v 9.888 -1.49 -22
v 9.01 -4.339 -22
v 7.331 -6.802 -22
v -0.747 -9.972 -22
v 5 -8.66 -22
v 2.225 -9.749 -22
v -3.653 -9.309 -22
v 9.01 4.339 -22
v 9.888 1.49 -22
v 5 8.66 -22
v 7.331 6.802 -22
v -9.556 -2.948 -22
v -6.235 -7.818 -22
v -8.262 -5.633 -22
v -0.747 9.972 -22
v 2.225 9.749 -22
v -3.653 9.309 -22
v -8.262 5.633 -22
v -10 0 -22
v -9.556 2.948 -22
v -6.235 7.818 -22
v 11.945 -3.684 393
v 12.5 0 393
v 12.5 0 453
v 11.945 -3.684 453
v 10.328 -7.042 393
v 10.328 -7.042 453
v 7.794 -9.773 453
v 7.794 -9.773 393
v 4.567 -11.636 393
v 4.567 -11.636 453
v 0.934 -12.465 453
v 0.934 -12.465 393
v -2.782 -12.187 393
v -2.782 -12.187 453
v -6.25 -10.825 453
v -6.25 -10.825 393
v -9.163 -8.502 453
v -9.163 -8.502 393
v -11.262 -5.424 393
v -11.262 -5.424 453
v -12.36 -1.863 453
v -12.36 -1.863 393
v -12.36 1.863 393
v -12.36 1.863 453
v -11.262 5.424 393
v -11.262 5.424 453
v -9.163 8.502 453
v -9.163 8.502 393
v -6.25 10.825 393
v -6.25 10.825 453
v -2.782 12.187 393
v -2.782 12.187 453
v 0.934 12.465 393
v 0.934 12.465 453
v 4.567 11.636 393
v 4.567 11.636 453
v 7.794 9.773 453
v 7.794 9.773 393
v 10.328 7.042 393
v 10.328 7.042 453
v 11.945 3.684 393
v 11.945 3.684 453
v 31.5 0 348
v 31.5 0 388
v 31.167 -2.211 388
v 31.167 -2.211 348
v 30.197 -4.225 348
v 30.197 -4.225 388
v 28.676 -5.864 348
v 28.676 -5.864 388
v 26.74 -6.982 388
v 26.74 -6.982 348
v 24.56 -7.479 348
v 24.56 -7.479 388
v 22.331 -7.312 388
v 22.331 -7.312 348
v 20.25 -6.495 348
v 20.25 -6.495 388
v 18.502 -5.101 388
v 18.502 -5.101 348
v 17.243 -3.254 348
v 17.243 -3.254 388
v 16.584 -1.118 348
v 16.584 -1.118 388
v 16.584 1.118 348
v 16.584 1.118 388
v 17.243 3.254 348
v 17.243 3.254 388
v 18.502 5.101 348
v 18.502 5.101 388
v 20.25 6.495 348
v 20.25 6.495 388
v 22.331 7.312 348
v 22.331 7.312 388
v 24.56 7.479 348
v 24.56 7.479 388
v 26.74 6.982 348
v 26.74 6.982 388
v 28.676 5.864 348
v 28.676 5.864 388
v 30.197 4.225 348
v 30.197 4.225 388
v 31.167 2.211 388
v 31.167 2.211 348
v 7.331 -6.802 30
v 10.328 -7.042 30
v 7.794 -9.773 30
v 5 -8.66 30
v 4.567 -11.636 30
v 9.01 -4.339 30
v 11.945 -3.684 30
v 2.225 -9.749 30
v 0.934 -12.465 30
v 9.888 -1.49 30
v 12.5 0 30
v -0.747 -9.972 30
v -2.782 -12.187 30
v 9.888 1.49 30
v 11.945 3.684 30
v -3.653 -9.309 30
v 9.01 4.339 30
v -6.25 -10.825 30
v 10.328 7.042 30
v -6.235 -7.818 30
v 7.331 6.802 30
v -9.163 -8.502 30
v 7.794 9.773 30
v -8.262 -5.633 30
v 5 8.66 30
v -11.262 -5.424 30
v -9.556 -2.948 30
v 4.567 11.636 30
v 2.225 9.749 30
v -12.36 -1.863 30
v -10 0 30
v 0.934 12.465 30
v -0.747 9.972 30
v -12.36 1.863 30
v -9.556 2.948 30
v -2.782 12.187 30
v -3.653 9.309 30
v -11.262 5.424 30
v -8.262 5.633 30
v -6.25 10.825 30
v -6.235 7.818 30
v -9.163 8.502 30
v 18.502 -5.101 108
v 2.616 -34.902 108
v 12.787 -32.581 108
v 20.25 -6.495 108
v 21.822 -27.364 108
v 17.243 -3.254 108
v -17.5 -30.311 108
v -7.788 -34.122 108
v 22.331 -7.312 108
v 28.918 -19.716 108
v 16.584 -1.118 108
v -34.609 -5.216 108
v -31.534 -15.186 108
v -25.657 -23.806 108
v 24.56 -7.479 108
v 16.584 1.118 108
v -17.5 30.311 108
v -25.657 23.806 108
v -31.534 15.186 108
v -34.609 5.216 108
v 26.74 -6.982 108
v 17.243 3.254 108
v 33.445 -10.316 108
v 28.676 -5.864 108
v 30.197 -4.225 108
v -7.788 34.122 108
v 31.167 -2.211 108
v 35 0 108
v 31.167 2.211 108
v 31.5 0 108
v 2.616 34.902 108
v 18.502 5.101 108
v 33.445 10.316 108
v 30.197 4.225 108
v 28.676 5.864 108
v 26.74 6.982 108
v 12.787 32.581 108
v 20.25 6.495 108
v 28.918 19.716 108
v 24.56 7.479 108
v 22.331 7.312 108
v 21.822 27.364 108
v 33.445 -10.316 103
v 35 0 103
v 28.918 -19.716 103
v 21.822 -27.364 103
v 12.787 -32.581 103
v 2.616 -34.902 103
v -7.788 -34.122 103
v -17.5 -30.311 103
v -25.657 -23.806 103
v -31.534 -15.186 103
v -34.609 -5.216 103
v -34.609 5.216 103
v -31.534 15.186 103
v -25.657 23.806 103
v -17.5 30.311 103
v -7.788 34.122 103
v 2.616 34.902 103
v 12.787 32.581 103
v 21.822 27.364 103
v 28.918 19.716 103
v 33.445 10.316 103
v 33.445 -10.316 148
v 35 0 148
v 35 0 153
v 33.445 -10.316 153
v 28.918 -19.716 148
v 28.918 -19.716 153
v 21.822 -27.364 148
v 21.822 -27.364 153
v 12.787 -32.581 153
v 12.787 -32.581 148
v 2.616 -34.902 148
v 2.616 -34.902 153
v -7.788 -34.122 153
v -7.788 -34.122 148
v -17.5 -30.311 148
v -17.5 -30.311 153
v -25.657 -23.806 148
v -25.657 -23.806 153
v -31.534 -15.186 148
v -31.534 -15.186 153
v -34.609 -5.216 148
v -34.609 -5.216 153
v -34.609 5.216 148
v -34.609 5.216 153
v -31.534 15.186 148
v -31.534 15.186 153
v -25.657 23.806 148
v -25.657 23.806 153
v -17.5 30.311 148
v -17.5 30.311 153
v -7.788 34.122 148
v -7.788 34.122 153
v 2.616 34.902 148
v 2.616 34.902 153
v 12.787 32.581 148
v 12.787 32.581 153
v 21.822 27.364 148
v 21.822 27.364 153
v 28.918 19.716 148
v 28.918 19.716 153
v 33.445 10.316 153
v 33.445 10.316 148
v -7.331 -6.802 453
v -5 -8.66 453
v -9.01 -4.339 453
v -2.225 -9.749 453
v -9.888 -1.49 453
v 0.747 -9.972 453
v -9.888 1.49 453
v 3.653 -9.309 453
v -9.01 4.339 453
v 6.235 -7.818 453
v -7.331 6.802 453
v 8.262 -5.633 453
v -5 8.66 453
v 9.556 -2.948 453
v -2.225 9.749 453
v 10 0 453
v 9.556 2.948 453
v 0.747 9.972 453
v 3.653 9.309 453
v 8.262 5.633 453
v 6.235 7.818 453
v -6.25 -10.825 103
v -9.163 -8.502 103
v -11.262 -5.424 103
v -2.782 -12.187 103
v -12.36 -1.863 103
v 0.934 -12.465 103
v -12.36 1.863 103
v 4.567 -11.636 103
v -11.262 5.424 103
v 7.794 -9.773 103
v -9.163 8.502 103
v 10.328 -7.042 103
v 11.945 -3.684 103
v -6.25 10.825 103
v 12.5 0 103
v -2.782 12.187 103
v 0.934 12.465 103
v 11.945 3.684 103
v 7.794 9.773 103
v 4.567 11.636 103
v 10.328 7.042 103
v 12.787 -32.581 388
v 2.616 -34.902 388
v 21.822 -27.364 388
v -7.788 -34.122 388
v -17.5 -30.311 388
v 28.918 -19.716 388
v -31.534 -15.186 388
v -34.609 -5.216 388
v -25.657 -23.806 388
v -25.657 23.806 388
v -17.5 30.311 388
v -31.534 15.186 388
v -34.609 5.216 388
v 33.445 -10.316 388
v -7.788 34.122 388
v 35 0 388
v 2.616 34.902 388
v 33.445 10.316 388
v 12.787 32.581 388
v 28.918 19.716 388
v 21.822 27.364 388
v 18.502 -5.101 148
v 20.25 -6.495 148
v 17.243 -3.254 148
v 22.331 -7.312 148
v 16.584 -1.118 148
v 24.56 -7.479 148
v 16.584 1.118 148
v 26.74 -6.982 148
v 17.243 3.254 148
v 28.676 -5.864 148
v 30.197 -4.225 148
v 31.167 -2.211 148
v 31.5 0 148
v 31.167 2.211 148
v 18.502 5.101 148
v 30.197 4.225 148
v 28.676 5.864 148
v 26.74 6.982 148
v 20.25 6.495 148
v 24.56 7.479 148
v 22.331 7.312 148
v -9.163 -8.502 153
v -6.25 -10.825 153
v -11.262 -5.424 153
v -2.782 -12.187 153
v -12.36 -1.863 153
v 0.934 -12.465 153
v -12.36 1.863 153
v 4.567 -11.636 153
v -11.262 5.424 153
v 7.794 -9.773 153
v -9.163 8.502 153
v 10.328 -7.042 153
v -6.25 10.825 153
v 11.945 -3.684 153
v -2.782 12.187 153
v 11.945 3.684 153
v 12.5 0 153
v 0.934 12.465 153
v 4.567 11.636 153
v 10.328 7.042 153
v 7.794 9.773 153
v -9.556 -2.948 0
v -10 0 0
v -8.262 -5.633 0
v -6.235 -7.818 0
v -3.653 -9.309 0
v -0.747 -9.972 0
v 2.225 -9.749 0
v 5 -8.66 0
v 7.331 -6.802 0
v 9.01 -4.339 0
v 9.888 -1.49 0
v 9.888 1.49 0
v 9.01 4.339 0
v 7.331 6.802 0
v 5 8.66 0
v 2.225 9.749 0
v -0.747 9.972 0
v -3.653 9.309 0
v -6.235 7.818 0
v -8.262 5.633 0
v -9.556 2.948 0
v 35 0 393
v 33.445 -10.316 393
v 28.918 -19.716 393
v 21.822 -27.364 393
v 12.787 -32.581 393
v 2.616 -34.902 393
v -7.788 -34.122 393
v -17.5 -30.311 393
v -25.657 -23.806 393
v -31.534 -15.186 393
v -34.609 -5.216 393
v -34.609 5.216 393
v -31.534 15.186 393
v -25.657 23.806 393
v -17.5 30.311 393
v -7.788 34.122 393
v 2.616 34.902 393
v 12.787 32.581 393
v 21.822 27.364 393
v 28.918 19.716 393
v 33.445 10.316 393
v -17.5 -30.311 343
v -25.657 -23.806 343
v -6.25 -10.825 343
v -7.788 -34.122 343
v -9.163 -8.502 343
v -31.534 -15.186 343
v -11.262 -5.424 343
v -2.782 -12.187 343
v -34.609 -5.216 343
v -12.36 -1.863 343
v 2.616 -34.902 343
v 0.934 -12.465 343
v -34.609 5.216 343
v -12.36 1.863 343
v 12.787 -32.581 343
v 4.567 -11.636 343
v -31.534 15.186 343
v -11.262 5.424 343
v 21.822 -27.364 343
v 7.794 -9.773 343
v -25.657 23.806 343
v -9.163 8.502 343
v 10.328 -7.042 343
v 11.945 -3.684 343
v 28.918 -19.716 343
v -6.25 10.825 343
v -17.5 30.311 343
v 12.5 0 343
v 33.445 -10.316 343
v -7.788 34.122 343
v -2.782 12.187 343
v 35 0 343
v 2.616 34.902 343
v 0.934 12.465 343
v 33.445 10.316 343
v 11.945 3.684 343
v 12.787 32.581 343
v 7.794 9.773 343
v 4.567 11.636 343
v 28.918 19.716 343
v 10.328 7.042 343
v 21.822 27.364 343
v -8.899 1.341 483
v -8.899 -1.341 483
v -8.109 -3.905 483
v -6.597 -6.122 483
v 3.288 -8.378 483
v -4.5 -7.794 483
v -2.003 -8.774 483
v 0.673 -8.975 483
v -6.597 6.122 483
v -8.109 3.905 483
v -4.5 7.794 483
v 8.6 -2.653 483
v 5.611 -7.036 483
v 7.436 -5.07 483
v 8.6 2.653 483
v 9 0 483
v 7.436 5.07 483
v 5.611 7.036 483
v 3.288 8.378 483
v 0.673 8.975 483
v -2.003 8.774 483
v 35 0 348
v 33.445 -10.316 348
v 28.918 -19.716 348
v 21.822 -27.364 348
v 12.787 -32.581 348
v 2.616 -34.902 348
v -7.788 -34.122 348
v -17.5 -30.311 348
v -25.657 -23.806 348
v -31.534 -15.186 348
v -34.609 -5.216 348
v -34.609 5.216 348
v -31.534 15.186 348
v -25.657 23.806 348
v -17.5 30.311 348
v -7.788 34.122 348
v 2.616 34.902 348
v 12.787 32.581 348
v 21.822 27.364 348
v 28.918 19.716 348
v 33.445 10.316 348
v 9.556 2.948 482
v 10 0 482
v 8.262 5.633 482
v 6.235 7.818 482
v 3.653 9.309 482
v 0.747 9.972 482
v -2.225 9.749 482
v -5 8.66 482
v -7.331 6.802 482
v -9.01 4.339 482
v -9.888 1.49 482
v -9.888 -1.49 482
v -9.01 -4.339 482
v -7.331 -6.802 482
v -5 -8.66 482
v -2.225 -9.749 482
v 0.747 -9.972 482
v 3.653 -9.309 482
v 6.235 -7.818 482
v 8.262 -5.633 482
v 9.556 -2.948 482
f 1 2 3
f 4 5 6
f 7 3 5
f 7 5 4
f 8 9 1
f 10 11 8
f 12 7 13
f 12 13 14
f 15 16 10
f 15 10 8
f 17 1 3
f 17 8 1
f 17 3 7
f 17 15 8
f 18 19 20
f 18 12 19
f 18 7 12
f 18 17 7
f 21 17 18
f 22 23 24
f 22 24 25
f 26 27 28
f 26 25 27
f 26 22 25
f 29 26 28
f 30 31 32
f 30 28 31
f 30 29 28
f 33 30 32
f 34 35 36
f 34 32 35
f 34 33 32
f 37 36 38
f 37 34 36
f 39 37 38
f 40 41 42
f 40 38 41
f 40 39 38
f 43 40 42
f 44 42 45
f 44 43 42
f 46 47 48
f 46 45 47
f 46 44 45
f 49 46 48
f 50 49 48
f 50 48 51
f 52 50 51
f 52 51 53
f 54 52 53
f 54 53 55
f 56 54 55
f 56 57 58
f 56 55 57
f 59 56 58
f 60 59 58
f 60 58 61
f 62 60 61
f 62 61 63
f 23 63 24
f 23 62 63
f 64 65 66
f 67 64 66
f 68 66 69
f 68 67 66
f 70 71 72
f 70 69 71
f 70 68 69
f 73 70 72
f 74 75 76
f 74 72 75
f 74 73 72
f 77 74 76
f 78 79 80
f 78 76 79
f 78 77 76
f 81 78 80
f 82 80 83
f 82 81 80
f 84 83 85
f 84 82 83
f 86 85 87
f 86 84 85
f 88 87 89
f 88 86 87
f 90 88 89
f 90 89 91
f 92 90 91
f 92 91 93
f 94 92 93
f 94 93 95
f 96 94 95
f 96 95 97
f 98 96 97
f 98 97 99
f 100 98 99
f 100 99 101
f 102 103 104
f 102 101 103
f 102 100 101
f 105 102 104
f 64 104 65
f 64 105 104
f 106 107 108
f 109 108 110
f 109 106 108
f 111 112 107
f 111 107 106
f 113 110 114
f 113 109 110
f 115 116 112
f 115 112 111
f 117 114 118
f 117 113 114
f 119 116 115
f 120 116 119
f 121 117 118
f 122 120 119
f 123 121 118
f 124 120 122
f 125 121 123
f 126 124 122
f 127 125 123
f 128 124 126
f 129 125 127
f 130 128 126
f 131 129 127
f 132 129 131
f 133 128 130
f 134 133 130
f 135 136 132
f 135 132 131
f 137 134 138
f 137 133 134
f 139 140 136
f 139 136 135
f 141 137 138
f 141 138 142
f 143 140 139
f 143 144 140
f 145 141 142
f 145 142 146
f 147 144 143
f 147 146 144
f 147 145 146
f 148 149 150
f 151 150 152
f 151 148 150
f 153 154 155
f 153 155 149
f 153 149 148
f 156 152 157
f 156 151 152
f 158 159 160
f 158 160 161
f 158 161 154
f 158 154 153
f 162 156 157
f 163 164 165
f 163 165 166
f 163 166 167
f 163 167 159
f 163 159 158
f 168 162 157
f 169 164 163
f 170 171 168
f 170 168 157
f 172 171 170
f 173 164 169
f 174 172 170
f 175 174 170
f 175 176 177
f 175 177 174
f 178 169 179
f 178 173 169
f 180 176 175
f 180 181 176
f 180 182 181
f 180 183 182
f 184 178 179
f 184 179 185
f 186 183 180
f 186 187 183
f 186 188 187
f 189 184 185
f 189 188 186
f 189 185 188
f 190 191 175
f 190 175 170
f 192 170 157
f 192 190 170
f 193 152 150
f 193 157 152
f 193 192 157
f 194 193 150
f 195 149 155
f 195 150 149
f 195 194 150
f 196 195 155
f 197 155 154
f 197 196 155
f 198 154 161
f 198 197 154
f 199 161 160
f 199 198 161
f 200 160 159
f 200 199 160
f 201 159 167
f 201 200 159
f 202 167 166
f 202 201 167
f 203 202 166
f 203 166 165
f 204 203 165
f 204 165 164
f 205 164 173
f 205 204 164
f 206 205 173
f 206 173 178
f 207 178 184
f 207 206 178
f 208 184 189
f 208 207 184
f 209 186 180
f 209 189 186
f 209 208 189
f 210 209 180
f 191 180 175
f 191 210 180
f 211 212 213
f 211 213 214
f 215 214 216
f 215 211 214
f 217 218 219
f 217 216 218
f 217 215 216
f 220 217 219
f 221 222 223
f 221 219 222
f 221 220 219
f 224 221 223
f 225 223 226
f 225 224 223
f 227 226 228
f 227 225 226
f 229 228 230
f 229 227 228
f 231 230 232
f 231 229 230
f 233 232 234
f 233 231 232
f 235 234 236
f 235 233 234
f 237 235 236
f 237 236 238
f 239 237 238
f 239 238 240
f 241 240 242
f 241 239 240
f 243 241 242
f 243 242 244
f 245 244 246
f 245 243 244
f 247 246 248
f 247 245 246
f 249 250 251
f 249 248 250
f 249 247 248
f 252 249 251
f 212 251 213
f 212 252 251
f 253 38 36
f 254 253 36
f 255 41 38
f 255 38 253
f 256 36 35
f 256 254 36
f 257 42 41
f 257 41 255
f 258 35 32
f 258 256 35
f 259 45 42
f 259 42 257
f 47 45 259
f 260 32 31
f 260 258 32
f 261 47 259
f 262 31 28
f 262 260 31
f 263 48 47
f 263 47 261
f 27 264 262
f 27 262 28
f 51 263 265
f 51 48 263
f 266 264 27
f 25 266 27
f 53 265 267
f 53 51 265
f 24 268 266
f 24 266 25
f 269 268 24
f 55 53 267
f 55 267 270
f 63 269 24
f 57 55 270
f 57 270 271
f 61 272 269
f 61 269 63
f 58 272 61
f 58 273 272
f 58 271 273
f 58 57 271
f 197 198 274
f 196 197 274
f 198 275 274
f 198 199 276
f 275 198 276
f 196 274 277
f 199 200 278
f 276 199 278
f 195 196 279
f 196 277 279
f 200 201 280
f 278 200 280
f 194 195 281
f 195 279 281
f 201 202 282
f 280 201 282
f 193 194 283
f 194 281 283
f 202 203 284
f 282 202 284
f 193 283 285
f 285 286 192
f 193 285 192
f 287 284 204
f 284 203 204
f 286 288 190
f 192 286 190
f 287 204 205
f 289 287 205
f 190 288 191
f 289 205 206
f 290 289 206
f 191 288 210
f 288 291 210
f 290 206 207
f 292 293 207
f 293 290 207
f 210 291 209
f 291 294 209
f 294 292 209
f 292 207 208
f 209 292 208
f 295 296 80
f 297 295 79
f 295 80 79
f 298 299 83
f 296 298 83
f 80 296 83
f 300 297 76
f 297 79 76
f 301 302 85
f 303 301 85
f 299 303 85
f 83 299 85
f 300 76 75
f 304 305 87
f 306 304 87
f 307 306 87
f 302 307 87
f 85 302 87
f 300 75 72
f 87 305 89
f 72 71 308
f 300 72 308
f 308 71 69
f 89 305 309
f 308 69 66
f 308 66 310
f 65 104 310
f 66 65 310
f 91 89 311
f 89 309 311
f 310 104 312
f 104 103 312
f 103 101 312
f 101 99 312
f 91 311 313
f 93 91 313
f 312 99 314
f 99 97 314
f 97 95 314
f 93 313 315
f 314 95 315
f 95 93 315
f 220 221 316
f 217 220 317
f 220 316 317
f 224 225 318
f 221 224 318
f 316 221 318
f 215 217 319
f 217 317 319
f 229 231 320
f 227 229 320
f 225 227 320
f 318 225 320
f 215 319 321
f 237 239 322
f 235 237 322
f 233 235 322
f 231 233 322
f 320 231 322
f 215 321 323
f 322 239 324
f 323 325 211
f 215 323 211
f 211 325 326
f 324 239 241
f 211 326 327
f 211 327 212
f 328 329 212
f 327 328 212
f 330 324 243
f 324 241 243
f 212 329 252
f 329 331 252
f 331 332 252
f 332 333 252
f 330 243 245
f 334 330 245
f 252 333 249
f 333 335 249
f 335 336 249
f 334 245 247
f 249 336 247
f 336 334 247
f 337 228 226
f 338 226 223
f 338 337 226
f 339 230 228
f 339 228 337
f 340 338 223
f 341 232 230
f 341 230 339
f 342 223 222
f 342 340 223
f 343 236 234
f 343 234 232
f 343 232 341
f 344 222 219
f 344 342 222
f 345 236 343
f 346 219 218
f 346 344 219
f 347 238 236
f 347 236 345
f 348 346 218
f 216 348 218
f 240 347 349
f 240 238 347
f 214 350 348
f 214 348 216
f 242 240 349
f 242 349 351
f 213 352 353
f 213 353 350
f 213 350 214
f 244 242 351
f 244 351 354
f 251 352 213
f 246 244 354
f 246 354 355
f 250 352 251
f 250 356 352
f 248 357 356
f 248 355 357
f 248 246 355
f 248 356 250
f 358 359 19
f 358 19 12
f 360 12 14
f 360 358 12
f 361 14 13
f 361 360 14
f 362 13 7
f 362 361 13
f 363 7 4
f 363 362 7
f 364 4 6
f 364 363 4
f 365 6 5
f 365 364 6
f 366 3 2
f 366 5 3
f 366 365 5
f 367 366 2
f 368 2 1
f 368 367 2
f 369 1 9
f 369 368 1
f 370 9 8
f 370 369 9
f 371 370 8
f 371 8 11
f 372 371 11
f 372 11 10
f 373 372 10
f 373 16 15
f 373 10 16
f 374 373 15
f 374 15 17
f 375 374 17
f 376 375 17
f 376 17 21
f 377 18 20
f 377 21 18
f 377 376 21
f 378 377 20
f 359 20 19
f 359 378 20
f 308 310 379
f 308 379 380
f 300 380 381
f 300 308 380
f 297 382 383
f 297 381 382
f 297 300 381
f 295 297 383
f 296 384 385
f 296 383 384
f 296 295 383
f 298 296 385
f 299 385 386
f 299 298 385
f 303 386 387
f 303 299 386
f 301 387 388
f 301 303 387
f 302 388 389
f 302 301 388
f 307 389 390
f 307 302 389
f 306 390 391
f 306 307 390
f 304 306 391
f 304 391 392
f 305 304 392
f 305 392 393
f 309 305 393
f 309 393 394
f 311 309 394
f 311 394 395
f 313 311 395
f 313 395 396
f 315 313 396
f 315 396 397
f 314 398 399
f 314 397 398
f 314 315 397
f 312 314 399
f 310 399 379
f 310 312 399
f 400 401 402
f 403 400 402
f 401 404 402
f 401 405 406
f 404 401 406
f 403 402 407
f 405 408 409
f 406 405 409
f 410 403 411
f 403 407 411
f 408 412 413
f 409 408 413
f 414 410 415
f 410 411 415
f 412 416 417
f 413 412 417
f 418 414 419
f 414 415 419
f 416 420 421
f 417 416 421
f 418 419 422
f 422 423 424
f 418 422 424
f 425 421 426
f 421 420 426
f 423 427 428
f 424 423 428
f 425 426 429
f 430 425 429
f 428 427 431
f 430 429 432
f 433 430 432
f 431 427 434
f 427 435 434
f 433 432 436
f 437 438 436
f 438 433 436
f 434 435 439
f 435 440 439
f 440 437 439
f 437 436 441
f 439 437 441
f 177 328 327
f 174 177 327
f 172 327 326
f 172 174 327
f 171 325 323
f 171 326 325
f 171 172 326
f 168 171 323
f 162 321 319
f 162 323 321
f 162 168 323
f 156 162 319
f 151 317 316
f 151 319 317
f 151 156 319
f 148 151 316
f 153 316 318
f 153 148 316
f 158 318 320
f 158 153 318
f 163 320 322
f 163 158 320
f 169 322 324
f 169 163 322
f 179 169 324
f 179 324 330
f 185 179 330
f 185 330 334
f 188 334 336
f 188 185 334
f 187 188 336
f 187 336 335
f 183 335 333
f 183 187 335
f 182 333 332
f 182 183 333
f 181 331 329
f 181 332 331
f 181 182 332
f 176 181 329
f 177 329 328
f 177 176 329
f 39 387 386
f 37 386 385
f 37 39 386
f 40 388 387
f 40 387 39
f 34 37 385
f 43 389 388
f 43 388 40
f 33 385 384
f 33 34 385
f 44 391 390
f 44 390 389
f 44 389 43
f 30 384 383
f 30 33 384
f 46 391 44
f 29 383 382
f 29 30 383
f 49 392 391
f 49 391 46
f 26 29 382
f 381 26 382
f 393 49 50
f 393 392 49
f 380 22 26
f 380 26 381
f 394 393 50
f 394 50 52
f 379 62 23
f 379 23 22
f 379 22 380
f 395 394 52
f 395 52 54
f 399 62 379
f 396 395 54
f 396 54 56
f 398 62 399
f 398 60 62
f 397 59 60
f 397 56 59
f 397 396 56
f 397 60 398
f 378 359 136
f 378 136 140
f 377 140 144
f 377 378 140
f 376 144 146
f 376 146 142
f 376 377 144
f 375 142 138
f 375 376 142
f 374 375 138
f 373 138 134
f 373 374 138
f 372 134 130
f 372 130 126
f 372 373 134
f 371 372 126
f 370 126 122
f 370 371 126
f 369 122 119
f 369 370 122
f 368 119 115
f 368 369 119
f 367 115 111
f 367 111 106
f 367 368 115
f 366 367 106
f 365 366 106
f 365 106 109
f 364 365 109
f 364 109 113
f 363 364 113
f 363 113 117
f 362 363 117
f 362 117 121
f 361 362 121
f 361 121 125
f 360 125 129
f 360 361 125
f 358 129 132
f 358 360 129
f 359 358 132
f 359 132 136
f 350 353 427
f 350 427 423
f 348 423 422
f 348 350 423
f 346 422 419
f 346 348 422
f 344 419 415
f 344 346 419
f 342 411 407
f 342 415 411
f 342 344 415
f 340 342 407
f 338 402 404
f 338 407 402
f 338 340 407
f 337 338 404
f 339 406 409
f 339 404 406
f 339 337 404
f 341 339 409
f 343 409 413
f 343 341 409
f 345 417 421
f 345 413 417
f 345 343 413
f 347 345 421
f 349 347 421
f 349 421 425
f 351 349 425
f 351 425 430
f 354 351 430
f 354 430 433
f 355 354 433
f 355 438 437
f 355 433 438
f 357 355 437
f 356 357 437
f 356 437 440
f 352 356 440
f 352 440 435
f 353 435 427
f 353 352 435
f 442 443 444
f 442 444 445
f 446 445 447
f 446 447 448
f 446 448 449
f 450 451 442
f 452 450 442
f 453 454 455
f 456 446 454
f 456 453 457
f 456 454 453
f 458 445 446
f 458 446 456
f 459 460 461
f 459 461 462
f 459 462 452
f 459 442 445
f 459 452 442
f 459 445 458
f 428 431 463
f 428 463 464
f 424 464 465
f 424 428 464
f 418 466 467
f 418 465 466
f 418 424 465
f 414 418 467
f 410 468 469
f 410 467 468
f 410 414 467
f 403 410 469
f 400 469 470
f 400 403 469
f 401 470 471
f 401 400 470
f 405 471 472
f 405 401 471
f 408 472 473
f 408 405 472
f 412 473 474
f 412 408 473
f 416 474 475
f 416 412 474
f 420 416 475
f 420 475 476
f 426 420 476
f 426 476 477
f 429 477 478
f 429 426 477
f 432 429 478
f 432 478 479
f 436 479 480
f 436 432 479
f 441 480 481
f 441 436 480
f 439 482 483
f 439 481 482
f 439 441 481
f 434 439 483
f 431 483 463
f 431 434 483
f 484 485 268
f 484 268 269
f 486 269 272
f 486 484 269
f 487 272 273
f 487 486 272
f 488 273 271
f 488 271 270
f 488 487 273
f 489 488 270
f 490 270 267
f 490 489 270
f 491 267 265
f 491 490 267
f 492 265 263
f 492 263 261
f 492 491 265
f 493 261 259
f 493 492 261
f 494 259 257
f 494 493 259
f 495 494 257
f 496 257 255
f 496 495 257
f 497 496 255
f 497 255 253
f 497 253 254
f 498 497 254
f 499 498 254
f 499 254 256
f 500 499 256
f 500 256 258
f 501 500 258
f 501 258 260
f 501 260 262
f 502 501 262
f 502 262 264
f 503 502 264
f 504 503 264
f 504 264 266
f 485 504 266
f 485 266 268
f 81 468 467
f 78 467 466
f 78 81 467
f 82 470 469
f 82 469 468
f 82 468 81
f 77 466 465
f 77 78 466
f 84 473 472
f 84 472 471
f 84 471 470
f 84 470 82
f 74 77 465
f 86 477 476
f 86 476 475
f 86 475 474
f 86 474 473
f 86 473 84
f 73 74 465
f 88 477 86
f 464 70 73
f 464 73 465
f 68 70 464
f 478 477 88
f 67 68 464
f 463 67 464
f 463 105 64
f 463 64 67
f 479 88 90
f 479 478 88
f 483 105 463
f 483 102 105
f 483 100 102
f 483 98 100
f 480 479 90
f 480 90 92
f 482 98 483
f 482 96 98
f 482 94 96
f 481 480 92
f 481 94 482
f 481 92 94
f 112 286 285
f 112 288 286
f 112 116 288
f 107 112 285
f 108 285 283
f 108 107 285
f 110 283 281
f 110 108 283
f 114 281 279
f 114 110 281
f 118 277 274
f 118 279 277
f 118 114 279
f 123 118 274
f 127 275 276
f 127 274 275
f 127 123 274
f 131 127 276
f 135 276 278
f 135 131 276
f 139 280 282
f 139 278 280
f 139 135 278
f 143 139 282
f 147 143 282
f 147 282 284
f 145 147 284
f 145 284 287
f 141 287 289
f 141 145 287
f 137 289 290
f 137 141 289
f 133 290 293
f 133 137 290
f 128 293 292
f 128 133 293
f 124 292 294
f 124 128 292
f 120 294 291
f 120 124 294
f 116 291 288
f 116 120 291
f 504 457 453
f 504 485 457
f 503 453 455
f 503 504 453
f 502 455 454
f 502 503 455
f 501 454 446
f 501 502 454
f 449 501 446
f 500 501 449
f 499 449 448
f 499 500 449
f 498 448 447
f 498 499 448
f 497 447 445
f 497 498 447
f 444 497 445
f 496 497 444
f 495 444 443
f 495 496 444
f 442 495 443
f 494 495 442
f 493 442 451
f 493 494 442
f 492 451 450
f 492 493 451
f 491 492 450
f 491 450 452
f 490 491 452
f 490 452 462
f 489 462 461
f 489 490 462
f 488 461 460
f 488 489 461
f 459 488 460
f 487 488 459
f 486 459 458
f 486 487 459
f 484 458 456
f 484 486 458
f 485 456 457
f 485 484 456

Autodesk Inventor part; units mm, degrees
ref_plane "YZ Plane" through (0, 0, 0) normal (1, 0, 0) x (0, 1, 0)
ref_plane "XZ Plane" through (0, 0, 0) normal (0, 1, 0) x (-1, 0, 0)
ref_plane "XY Plane" through (0, 0, 0) normal (0, 0, 1) x (1, 0, 0)
sketch "草图1" plane through (0, 0, 0) normal (0, 0, 1) x (1, 0, 0)
  circle A0 centre (0, 0) radius 12.5
  dimension "d0" = 25
extrude "拉伸1" add sketch "草图1" along normal blind 103
sketch "草图2" plane through (0, 0, 103) normal (0, 0, 1) x (1, 0, 0)
  circle A0 centre (0, 0) radius 35
  dimension "d3" = 70
extrude "拉伸2" add sketch "草图2" along normal blind 5
sketch "草图3" plane through (0, 0, 108) normal (0, 0, 1) x (1, 0, 0)
  circle A0 centre (24, 0) radius 7.5
  line L0 (0, 0) -> (4.085, 0)
  dimension "d6" = 15
  dimension "d7" = 4.085
  dimension "d8" = 24
extrude "拉伸3" add sketch "草图3" along normal blind 40
sketch "草图4" plane through (24, 0, 148) normal (0, 0, 1) x (1, 0, 0)
  circle A0 centre (-24, 0) radius 35
  circle A1 centre (-24, 0) radius 35 projected
  dimension "d11" = 70
extrude "拉伸4" add sketch "草图4" along normal blind 5
sketch "草图5" plane through (0, 0, 153) normal (0, 0, 1) x (1, 0, 0)
  circle A0 centre (0, 0) radius 12.5
  dimension "d14" = 25
extrude "拉伸5" add sketch "草图5" along normal blind 190
sketch "草图6" plane through (0, 0, 343) normal (0, 0, 1) x (1, 0, 0)
  circle A0 centre (0, 0) radius 35
  dimension "d17" = 70
extrude "拉伸6" add sketch "草图6" along normal blind 5
sketch "草图7" plane through (0, 0, 348) normal (0, 0, 1) x (1, 0, 0)
  circle A0 centre (24, 0) radius 7.5
  circle A1 centre (24, 0) radius 7.5 projected
  point P0 (0, 0)
  dimension "d20" = 15
extrude "拉伸7" add sketch "草图7" along normal blind 40
sketch "草图8" plane through (24, 0, 388) normal (0, 0, 1) x (1, 0, 0)
  circle A0 centre (-24, 0) radius 12.5 projected
  circle A1 centre (-24, 0) radius 35
  dimension "d23" = 70
extrude "拉伸8" add sketch "草图8" along normal blind 5 contours A0 | A1
sketch "草图9" plane through (0, 0, 393) normal (0, 0, 1) x (1, 0, 0)
  circle A0 centre (0, 0) radius 12.5
  dimension "d26" = 25
extrude "拉伸9" add sketch "草图9" along normal blind 90
sketch "草图10" plane through (0, 0, 483) normal (0, 0, 1) x (1, 0, 0)
  circle A0 centre (0, 0) radius 10
  circle A1 centre (0, 0) radius 12.5
  dimension "d32" = 20
  dimension "d33" = 25
extrude "拉伸10" cut sketch "草图10" against normal blind 30
chamfer "倒角2" distance 1 angle 45 1 edges at (-10, 0, 483)
sketch "草图11" plane through (0, 0, 0) normal (0, 0, -1) x (-1, 0, 0)
  circle A0 centre (0, 0) radius 10
  circle A1 centre (0, 0) radius 12.5
  dimension "d39" = 20
  dimension "d40" = 25
extrude "拉伸11" cut sketch "草图11" against normal blind 30
sketch "草图12" plane through (0, 0, 0) normal (0, 0, -1) x (-1, 0, 0)
  circle A0 centre (0, 0) radius 10
  dimension "d43" = 20
extrude "拉伸12" add sketch "草图12" along normal blind 22
properties part number "砂轮架带动曲轴"
